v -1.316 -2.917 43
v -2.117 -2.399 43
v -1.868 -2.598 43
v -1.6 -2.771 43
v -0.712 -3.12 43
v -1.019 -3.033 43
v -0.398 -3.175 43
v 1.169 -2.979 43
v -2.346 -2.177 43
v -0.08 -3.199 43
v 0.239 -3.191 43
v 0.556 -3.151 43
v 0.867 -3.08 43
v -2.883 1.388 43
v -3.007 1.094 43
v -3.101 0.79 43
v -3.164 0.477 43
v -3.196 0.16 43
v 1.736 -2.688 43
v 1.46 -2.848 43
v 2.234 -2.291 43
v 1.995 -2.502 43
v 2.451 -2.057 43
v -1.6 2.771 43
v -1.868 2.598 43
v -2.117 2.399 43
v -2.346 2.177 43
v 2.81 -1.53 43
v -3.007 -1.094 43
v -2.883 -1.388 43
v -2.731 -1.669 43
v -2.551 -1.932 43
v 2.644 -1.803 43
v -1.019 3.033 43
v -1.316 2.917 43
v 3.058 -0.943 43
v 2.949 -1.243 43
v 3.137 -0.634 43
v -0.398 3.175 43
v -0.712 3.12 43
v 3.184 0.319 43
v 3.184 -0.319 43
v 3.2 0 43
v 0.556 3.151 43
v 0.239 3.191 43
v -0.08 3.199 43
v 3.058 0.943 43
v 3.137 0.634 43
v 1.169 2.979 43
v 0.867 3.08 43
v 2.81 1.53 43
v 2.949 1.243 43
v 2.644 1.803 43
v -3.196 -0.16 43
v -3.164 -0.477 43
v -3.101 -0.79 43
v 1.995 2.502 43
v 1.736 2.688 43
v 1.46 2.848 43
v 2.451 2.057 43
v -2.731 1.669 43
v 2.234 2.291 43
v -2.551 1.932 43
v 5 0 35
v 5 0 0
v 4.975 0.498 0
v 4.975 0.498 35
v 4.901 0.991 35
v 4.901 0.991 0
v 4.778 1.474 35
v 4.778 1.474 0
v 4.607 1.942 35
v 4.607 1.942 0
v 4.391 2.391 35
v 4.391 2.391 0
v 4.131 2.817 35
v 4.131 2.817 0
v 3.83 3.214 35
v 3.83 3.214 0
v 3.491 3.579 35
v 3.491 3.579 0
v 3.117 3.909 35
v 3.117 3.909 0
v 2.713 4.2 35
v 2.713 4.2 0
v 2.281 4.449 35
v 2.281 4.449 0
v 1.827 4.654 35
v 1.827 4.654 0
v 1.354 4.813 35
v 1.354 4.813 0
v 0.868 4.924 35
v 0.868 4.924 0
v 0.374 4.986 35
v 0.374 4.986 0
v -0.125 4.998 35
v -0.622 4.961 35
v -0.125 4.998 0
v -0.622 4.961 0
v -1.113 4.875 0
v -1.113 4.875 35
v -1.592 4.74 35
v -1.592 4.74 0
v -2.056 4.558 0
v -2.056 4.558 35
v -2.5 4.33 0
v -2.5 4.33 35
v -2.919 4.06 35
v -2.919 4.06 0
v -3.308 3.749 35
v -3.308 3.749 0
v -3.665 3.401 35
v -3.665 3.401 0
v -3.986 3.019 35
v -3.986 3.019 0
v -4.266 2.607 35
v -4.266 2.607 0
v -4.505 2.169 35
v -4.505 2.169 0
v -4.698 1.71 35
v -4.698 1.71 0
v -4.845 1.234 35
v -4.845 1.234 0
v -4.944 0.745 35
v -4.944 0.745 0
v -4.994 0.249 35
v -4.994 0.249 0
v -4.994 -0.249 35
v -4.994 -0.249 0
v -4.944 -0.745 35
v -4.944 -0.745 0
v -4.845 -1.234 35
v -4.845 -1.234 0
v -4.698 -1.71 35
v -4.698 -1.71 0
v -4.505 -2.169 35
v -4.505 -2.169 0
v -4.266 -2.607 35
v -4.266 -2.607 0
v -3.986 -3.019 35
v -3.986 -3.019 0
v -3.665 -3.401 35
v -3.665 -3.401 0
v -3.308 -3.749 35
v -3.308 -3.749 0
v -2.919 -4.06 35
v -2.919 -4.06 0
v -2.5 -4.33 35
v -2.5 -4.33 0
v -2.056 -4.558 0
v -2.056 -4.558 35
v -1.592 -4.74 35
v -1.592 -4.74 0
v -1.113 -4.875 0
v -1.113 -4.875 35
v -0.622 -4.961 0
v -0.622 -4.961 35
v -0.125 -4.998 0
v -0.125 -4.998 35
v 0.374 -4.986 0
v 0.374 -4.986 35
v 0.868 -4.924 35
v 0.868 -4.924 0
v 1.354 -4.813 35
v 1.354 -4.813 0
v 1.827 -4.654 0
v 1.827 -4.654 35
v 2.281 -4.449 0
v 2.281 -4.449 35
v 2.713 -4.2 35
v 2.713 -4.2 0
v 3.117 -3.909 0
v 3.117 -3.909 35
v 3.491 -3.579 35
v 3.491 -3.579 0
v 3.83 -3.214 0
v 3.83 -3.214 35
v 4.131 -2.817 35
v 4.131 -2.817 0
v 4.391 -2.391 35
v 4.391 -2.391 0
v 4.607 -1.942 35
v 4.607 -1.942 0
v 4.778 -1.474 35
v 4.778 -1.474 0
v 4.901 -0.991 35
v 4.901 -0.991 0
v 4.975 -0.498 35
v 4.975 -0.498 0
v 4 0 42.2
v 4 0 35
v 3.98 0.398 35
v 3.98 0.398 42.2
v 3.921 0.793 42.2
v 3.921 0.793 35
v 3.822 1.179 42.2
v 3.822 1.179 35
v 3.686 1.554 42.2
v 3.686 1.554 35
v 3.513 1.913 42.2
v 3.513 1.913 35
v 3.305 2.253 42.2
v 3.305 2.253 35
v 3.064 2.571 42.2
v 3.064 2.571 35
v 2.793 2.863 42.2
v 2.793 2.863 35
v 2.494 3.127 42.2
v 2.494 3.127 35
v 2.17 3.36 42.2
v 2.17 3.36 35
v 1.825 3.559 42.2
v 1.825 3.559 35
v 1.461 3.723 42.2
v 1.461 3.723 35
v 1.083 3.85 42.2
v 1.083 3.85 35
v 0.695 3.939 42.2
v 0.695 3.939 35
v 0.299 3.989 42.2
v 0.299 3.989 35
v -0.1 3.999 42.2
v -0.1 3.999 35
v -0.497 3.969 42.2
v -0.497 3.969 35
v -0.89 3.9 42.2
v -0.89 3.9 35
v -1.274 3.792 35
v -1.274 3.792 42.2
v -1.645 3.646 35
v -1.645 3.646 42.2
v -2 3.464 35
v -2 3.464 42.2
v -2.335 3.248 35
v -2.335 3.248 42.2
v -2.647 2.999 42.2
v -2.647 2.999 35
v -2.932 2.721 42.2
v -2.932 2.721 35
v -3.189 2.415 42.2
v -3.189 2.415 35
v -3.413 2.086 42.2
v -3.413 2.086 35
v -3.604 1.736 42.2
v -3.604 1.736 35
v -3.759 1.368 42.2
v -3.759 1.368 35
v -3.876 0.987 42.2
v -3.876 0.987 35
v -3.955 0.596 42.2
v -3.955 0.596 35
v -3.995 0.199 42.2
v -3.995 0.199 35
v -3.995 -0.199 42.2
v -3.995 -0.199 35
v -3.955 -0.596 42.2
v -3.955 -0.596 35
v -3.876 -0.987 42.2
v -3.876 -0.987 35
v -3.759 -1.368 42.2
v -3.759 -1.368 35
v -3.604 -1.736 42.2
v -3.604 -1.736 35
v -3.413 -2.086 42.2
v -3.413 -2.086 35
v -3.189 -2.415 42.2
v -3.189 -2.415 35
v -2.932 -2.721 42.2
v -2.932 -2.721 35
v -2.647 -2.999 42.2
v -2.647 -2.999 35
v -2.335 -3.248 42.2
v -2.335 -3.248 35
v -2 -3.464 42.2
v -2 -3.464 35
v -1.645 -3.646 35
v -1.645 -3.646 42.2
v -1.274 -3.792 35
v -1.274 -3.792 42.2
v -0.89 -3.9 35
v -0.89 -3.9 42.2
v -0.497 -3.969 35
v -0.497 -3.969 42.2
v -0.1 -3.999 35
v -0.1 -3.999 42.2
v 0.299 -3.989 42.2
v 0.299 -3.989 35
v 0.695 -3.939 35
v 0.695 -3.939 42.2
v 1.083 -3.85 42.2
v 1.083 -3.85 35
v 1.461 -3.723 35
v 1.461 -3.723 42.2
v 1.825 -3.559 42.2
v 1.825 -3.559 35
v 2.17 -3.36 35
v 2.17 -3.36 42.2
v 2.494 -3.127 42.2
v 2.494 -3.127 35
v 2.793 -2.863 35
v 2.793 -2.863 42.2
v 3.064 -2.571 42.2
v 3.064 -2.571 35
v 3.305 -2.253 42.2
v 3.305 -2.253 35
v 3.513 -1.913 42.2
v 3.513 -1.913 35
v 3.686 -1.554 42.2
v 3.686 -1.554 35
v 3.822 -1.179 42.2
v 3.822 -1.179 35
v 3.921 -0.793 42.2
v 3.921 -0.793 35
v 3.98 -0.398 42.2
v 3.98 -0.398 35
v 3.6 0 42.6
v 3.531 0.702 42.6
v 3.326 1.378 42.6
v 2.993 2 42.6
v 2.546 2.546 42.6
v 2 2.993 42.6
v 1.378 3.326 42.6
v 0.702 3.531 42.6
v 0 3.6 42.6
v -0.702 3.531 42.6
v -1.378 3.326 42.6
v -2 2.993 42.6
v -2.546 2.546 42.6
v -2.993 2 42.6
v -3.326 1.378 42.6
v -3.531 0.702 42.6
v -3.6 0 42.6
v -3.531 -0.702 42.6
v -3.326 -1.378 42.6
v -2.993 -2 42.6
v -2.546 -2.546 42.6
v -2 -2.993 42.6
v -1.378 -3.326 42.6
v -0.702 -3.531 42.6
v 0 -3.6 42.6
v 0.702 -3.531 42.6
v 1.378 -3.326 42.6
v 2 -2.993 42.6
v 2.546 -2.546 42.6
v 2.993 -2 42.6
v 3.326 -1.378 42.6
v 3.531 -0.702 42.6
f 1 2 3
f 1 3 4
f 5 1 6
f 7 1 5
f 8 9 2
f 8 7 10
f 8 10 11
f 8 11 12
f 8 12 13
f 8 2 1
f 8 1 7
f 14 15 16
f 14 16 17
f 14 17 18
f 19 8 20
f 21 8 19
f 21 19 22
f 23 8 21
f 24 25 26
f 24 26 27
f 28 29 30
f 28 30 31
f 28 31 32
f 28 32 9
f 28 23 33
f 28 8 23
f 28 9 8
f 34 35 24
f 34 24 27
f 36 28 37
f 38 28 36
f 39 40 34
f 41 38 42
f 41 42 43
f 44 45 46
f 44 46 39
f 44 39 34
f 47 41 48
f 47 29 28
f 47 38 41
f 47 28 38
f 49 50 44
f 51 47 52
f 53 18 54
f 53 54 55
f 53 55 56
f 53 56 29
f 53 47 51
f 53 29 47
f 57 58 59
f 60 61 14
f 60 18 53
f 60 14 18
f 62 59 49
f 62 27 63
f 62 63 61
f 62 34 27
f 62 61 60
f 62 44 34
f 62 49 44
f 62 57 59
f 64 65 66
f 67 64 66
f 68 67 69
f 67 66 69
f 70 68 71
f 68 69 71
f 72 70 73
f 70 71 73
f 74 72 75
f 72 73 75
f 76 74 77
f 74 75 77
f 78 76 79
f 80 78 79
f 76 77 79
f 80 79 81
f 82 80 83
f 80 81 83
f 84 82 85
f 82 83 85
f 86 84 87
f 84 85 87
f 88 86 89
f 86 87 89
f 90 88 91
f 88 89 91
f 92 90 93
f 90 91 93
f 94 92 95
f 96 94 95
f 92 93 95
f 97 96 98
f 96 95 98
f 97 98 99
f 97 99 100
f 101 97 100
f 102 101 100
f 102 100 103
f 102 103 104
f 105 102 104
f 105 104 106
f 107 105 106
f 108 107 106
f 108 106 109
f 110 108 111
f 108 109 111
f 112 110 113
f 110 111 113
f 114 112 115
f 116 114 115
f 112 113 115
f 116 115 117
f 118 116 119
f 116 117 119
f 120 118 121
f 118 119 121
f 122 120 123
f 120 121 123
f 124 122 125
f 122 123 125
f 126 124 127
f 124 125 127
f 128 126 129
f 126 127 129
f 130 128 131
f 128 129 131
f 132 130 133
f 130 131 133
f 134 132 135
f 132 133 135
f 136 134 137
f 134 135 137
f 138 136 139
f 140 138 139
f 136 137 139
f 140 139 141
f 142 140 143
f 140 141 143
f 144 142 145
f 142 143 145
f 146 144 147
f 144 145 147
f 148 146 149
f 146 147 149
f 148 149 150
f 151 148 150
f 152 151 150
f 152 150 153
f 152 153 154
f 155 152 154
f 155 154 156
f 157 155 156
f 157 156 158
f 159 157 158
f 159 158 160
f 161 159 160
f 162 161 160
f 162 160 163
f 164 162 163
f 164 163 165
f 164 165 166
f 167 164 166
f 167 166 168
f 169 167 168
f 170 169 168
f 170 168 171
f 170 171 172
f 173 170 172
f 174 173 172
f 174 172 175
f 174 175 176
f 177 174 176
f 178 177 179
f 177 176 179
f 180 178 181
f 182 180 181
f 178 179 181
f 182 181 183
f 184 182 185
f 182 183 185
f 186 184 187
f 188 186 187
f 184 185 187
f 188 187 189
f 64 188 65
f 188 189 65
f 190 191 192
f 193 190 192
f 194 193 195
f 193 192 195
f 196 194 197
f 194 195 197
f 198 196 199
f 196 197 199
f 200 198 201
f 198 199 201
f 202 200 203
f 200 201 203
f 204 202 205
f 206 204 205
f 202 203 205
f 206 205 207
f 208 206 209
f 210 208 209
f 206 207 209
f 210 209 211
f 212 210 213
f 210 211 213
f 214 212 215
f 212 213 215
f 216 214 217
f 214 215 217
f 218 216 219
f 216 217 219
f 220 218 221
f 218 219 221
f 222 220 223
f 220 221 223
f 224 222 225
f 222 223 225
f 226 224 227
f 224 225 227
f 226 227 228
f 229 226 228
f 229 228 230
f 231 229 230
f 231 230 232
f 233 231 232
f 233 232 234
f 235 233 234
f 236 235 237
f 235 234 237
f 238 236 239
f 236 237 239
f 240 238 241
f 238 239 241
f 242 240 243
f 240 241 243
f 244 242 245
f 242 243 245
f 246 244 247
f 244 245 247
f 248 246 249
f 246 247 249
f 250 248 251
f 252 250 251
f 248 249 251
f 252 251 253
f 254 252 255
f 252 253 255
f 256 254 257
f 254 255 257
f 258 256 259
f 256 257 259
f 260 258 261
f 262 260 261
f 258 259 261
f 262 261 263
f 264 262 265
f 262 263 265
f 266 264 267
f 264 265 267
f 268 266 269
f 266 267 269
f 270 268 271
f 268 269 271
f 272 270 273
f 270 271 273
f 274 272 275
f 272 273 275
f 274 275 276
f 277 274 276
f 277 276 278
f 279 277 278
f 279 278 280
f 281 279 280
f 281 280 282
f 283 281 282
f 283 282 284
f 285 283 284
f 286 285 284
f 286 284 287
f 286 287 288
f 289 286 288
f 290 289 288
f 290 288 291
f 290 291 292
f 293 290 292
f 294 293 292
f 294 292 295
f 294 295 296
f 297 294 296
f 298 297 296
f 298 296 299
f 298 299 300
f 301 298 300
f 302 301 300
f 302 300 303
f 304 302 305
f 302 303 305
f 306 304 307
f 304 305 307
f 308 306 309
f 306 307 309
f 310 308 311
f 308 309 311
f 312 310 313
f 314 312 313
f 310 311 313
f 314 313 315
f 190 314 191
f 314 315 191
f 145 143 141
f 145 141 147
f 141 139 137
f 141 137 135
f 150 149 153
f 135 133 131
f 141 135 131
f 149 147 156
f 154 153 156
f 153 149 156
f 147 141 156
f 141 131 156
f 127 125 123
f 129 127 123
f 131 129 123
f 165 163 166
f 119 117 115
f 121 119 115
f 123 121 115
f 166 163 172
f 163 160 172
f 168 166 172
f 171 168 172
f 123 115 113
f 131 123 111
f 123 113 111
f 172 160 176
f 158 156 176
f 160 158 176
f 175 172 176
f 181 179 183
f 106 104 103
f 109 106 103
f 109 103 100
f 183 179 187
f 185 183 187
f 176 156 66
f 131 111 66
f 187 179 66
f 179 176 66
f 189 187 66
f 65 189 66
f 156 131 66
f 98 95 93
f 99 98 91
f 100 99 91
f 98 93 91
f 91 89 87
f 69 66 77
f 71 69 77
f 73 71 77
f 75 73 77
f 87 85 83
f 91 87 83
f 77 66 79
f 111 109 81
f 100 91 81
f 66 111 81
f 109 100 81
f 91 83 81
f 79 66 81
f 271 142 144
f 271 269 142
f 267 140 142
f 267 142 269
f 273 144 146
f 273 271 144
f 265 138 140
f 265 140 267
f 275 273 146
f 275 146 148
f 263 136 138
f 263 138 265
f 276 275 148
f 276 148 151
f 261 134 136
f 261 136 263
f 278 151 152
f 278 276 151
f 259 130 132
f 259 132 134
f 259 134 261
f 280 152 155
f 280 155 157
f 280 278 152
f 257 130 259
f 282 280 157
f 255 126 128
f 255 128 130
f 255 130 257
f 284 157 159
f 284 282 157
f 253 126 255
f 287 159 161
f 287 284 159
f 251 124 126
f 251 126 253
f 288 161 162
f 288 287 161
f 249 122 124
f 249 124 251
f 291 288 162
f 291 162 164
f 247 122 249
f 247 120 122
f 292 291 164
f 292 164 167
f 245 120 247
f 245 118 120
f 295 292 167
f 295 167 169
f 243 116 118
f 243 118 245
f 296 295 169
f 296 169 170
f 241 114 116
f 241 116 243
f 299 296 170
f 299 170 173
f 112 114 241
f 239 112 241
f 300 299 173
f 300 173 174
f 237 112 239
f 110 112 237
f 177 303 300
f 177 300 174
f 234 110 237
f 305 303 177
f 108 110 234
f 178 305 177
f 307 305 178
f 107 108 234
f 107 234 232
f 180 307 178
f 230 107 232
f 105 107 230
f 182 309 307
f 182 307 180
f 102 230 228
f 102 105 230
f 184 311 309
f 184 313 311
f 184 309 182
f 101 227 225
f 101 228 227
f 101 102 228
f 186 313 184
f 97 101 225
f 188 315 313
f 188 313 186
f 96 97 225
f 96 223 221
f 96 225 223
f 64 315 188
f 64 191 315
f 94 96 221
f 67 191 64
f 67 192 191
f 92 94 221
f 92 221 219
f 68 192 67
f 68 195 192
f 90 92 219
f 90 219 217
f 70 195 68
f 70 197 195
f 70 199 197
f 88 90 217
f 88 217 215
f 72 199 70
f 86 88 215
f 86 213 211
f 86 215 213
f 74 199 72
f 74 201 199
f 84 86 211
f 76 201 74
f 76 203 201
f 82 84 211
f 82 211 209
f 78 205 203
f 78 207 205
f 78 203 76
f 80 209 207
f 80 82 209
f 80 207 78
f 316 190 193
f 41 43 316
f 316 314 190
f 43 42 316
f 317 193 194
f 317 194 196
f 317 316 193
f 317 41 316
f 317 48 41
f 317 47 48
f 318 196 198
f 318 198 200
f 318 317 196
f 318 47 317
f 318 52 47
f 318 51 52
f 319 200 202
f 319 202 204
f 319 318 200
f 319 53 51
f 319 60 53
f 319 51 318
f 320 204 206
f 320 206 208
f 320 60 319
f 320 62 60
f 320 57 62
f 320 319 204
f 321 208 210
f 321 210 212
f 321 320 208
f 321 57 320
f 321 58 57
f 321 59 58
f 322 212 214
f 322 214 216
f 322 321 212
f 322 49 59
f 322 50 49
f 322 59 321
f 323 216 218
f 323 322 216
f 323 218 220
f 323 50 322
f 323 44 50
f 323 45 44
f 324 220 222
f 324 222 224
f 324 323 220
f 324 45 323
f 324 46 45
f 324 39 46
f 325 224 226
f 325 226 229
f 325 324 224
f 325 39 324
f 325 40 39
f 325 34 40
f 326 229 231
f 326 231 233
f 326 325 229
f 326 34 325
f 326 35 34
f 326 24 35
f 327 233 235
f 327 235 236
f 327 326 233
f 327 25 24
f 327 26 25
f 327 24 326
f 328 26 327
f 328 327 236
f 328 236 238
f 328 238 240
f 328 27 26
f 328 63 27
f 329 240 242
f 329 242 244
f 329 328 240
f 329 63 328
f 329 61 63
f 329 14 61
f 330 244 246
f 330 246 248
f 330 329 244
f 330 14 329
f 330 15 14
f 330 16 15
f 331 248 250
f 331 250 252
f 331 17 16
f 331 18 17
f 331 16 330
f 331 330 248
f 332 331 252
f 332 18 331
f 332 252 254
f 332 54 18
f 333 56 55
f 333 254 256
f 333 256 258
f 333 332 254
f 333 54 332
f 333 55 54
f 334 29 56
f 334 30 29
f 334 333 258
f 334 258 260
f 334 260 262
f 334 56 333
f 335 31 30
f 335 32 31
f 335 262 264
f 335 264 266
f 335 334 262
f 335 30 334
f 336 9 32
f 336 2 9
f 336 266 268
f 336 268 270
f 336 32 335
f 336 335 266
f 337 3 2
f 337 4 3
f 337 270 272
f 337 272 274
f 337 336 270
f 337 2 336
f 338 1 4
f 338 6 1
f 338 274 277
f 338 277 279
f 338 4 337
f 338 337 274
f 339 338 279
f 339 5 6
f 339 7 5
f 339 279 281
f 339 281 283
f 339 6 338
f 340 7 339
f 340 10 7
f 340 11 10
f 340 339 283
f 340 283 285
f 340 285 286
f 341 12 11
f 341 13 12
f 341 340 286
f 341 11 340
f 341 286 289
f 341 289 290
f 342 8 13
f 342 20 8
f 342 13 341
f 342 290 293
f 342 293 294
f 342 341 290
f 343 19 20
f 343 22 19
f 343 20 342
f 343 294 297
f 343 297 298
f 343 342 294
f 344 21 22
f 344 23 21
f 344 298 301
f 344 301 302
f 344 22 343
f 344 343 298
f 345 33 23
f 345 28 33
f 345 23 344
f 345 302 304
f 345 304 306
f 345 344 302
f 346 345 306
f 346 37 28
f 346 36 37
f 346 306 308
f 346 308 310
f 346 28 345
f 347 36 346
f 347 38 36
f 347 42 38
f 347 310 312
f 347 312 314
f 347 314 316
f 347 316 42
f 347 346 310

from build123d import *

# Parameters (mm, degrees)
ESQUISSE1_R          = 5
BASE_EXTRUSION_DEPTH = 35
ESQUISSE4_R          = 4
BOSS_EXTRU_1_DEPTH   = 8
CHANFREIN1_SIZE      = 0.8


with BuildPart() as part:
    # Esquisse1 → Base-Extrusion (new body)
    with BuildSketch(Plane.XY):
        Circle(ESQUISSE1_R)
    extrude(amount=BASE_EXTRUSION_DEPTH)

    # Esquisse4 → Boss.-Extru.1 (add)
    with BuildSketch(Plane.XY.offset(35)):
        Circle(ESQUISSE4_R)
    extrude(amount=BOSS_EXTRU_1_DEPTH)

    # Chanfrein1
    chanfrein1_edges = [part.edges().sort_by_distance(p)[0] for p in [
        (-4, 0, 43),
    ]]
    chamfer(chanfrein1_edges, length=CHANFREIN1_SIZE)


solid = part.part
